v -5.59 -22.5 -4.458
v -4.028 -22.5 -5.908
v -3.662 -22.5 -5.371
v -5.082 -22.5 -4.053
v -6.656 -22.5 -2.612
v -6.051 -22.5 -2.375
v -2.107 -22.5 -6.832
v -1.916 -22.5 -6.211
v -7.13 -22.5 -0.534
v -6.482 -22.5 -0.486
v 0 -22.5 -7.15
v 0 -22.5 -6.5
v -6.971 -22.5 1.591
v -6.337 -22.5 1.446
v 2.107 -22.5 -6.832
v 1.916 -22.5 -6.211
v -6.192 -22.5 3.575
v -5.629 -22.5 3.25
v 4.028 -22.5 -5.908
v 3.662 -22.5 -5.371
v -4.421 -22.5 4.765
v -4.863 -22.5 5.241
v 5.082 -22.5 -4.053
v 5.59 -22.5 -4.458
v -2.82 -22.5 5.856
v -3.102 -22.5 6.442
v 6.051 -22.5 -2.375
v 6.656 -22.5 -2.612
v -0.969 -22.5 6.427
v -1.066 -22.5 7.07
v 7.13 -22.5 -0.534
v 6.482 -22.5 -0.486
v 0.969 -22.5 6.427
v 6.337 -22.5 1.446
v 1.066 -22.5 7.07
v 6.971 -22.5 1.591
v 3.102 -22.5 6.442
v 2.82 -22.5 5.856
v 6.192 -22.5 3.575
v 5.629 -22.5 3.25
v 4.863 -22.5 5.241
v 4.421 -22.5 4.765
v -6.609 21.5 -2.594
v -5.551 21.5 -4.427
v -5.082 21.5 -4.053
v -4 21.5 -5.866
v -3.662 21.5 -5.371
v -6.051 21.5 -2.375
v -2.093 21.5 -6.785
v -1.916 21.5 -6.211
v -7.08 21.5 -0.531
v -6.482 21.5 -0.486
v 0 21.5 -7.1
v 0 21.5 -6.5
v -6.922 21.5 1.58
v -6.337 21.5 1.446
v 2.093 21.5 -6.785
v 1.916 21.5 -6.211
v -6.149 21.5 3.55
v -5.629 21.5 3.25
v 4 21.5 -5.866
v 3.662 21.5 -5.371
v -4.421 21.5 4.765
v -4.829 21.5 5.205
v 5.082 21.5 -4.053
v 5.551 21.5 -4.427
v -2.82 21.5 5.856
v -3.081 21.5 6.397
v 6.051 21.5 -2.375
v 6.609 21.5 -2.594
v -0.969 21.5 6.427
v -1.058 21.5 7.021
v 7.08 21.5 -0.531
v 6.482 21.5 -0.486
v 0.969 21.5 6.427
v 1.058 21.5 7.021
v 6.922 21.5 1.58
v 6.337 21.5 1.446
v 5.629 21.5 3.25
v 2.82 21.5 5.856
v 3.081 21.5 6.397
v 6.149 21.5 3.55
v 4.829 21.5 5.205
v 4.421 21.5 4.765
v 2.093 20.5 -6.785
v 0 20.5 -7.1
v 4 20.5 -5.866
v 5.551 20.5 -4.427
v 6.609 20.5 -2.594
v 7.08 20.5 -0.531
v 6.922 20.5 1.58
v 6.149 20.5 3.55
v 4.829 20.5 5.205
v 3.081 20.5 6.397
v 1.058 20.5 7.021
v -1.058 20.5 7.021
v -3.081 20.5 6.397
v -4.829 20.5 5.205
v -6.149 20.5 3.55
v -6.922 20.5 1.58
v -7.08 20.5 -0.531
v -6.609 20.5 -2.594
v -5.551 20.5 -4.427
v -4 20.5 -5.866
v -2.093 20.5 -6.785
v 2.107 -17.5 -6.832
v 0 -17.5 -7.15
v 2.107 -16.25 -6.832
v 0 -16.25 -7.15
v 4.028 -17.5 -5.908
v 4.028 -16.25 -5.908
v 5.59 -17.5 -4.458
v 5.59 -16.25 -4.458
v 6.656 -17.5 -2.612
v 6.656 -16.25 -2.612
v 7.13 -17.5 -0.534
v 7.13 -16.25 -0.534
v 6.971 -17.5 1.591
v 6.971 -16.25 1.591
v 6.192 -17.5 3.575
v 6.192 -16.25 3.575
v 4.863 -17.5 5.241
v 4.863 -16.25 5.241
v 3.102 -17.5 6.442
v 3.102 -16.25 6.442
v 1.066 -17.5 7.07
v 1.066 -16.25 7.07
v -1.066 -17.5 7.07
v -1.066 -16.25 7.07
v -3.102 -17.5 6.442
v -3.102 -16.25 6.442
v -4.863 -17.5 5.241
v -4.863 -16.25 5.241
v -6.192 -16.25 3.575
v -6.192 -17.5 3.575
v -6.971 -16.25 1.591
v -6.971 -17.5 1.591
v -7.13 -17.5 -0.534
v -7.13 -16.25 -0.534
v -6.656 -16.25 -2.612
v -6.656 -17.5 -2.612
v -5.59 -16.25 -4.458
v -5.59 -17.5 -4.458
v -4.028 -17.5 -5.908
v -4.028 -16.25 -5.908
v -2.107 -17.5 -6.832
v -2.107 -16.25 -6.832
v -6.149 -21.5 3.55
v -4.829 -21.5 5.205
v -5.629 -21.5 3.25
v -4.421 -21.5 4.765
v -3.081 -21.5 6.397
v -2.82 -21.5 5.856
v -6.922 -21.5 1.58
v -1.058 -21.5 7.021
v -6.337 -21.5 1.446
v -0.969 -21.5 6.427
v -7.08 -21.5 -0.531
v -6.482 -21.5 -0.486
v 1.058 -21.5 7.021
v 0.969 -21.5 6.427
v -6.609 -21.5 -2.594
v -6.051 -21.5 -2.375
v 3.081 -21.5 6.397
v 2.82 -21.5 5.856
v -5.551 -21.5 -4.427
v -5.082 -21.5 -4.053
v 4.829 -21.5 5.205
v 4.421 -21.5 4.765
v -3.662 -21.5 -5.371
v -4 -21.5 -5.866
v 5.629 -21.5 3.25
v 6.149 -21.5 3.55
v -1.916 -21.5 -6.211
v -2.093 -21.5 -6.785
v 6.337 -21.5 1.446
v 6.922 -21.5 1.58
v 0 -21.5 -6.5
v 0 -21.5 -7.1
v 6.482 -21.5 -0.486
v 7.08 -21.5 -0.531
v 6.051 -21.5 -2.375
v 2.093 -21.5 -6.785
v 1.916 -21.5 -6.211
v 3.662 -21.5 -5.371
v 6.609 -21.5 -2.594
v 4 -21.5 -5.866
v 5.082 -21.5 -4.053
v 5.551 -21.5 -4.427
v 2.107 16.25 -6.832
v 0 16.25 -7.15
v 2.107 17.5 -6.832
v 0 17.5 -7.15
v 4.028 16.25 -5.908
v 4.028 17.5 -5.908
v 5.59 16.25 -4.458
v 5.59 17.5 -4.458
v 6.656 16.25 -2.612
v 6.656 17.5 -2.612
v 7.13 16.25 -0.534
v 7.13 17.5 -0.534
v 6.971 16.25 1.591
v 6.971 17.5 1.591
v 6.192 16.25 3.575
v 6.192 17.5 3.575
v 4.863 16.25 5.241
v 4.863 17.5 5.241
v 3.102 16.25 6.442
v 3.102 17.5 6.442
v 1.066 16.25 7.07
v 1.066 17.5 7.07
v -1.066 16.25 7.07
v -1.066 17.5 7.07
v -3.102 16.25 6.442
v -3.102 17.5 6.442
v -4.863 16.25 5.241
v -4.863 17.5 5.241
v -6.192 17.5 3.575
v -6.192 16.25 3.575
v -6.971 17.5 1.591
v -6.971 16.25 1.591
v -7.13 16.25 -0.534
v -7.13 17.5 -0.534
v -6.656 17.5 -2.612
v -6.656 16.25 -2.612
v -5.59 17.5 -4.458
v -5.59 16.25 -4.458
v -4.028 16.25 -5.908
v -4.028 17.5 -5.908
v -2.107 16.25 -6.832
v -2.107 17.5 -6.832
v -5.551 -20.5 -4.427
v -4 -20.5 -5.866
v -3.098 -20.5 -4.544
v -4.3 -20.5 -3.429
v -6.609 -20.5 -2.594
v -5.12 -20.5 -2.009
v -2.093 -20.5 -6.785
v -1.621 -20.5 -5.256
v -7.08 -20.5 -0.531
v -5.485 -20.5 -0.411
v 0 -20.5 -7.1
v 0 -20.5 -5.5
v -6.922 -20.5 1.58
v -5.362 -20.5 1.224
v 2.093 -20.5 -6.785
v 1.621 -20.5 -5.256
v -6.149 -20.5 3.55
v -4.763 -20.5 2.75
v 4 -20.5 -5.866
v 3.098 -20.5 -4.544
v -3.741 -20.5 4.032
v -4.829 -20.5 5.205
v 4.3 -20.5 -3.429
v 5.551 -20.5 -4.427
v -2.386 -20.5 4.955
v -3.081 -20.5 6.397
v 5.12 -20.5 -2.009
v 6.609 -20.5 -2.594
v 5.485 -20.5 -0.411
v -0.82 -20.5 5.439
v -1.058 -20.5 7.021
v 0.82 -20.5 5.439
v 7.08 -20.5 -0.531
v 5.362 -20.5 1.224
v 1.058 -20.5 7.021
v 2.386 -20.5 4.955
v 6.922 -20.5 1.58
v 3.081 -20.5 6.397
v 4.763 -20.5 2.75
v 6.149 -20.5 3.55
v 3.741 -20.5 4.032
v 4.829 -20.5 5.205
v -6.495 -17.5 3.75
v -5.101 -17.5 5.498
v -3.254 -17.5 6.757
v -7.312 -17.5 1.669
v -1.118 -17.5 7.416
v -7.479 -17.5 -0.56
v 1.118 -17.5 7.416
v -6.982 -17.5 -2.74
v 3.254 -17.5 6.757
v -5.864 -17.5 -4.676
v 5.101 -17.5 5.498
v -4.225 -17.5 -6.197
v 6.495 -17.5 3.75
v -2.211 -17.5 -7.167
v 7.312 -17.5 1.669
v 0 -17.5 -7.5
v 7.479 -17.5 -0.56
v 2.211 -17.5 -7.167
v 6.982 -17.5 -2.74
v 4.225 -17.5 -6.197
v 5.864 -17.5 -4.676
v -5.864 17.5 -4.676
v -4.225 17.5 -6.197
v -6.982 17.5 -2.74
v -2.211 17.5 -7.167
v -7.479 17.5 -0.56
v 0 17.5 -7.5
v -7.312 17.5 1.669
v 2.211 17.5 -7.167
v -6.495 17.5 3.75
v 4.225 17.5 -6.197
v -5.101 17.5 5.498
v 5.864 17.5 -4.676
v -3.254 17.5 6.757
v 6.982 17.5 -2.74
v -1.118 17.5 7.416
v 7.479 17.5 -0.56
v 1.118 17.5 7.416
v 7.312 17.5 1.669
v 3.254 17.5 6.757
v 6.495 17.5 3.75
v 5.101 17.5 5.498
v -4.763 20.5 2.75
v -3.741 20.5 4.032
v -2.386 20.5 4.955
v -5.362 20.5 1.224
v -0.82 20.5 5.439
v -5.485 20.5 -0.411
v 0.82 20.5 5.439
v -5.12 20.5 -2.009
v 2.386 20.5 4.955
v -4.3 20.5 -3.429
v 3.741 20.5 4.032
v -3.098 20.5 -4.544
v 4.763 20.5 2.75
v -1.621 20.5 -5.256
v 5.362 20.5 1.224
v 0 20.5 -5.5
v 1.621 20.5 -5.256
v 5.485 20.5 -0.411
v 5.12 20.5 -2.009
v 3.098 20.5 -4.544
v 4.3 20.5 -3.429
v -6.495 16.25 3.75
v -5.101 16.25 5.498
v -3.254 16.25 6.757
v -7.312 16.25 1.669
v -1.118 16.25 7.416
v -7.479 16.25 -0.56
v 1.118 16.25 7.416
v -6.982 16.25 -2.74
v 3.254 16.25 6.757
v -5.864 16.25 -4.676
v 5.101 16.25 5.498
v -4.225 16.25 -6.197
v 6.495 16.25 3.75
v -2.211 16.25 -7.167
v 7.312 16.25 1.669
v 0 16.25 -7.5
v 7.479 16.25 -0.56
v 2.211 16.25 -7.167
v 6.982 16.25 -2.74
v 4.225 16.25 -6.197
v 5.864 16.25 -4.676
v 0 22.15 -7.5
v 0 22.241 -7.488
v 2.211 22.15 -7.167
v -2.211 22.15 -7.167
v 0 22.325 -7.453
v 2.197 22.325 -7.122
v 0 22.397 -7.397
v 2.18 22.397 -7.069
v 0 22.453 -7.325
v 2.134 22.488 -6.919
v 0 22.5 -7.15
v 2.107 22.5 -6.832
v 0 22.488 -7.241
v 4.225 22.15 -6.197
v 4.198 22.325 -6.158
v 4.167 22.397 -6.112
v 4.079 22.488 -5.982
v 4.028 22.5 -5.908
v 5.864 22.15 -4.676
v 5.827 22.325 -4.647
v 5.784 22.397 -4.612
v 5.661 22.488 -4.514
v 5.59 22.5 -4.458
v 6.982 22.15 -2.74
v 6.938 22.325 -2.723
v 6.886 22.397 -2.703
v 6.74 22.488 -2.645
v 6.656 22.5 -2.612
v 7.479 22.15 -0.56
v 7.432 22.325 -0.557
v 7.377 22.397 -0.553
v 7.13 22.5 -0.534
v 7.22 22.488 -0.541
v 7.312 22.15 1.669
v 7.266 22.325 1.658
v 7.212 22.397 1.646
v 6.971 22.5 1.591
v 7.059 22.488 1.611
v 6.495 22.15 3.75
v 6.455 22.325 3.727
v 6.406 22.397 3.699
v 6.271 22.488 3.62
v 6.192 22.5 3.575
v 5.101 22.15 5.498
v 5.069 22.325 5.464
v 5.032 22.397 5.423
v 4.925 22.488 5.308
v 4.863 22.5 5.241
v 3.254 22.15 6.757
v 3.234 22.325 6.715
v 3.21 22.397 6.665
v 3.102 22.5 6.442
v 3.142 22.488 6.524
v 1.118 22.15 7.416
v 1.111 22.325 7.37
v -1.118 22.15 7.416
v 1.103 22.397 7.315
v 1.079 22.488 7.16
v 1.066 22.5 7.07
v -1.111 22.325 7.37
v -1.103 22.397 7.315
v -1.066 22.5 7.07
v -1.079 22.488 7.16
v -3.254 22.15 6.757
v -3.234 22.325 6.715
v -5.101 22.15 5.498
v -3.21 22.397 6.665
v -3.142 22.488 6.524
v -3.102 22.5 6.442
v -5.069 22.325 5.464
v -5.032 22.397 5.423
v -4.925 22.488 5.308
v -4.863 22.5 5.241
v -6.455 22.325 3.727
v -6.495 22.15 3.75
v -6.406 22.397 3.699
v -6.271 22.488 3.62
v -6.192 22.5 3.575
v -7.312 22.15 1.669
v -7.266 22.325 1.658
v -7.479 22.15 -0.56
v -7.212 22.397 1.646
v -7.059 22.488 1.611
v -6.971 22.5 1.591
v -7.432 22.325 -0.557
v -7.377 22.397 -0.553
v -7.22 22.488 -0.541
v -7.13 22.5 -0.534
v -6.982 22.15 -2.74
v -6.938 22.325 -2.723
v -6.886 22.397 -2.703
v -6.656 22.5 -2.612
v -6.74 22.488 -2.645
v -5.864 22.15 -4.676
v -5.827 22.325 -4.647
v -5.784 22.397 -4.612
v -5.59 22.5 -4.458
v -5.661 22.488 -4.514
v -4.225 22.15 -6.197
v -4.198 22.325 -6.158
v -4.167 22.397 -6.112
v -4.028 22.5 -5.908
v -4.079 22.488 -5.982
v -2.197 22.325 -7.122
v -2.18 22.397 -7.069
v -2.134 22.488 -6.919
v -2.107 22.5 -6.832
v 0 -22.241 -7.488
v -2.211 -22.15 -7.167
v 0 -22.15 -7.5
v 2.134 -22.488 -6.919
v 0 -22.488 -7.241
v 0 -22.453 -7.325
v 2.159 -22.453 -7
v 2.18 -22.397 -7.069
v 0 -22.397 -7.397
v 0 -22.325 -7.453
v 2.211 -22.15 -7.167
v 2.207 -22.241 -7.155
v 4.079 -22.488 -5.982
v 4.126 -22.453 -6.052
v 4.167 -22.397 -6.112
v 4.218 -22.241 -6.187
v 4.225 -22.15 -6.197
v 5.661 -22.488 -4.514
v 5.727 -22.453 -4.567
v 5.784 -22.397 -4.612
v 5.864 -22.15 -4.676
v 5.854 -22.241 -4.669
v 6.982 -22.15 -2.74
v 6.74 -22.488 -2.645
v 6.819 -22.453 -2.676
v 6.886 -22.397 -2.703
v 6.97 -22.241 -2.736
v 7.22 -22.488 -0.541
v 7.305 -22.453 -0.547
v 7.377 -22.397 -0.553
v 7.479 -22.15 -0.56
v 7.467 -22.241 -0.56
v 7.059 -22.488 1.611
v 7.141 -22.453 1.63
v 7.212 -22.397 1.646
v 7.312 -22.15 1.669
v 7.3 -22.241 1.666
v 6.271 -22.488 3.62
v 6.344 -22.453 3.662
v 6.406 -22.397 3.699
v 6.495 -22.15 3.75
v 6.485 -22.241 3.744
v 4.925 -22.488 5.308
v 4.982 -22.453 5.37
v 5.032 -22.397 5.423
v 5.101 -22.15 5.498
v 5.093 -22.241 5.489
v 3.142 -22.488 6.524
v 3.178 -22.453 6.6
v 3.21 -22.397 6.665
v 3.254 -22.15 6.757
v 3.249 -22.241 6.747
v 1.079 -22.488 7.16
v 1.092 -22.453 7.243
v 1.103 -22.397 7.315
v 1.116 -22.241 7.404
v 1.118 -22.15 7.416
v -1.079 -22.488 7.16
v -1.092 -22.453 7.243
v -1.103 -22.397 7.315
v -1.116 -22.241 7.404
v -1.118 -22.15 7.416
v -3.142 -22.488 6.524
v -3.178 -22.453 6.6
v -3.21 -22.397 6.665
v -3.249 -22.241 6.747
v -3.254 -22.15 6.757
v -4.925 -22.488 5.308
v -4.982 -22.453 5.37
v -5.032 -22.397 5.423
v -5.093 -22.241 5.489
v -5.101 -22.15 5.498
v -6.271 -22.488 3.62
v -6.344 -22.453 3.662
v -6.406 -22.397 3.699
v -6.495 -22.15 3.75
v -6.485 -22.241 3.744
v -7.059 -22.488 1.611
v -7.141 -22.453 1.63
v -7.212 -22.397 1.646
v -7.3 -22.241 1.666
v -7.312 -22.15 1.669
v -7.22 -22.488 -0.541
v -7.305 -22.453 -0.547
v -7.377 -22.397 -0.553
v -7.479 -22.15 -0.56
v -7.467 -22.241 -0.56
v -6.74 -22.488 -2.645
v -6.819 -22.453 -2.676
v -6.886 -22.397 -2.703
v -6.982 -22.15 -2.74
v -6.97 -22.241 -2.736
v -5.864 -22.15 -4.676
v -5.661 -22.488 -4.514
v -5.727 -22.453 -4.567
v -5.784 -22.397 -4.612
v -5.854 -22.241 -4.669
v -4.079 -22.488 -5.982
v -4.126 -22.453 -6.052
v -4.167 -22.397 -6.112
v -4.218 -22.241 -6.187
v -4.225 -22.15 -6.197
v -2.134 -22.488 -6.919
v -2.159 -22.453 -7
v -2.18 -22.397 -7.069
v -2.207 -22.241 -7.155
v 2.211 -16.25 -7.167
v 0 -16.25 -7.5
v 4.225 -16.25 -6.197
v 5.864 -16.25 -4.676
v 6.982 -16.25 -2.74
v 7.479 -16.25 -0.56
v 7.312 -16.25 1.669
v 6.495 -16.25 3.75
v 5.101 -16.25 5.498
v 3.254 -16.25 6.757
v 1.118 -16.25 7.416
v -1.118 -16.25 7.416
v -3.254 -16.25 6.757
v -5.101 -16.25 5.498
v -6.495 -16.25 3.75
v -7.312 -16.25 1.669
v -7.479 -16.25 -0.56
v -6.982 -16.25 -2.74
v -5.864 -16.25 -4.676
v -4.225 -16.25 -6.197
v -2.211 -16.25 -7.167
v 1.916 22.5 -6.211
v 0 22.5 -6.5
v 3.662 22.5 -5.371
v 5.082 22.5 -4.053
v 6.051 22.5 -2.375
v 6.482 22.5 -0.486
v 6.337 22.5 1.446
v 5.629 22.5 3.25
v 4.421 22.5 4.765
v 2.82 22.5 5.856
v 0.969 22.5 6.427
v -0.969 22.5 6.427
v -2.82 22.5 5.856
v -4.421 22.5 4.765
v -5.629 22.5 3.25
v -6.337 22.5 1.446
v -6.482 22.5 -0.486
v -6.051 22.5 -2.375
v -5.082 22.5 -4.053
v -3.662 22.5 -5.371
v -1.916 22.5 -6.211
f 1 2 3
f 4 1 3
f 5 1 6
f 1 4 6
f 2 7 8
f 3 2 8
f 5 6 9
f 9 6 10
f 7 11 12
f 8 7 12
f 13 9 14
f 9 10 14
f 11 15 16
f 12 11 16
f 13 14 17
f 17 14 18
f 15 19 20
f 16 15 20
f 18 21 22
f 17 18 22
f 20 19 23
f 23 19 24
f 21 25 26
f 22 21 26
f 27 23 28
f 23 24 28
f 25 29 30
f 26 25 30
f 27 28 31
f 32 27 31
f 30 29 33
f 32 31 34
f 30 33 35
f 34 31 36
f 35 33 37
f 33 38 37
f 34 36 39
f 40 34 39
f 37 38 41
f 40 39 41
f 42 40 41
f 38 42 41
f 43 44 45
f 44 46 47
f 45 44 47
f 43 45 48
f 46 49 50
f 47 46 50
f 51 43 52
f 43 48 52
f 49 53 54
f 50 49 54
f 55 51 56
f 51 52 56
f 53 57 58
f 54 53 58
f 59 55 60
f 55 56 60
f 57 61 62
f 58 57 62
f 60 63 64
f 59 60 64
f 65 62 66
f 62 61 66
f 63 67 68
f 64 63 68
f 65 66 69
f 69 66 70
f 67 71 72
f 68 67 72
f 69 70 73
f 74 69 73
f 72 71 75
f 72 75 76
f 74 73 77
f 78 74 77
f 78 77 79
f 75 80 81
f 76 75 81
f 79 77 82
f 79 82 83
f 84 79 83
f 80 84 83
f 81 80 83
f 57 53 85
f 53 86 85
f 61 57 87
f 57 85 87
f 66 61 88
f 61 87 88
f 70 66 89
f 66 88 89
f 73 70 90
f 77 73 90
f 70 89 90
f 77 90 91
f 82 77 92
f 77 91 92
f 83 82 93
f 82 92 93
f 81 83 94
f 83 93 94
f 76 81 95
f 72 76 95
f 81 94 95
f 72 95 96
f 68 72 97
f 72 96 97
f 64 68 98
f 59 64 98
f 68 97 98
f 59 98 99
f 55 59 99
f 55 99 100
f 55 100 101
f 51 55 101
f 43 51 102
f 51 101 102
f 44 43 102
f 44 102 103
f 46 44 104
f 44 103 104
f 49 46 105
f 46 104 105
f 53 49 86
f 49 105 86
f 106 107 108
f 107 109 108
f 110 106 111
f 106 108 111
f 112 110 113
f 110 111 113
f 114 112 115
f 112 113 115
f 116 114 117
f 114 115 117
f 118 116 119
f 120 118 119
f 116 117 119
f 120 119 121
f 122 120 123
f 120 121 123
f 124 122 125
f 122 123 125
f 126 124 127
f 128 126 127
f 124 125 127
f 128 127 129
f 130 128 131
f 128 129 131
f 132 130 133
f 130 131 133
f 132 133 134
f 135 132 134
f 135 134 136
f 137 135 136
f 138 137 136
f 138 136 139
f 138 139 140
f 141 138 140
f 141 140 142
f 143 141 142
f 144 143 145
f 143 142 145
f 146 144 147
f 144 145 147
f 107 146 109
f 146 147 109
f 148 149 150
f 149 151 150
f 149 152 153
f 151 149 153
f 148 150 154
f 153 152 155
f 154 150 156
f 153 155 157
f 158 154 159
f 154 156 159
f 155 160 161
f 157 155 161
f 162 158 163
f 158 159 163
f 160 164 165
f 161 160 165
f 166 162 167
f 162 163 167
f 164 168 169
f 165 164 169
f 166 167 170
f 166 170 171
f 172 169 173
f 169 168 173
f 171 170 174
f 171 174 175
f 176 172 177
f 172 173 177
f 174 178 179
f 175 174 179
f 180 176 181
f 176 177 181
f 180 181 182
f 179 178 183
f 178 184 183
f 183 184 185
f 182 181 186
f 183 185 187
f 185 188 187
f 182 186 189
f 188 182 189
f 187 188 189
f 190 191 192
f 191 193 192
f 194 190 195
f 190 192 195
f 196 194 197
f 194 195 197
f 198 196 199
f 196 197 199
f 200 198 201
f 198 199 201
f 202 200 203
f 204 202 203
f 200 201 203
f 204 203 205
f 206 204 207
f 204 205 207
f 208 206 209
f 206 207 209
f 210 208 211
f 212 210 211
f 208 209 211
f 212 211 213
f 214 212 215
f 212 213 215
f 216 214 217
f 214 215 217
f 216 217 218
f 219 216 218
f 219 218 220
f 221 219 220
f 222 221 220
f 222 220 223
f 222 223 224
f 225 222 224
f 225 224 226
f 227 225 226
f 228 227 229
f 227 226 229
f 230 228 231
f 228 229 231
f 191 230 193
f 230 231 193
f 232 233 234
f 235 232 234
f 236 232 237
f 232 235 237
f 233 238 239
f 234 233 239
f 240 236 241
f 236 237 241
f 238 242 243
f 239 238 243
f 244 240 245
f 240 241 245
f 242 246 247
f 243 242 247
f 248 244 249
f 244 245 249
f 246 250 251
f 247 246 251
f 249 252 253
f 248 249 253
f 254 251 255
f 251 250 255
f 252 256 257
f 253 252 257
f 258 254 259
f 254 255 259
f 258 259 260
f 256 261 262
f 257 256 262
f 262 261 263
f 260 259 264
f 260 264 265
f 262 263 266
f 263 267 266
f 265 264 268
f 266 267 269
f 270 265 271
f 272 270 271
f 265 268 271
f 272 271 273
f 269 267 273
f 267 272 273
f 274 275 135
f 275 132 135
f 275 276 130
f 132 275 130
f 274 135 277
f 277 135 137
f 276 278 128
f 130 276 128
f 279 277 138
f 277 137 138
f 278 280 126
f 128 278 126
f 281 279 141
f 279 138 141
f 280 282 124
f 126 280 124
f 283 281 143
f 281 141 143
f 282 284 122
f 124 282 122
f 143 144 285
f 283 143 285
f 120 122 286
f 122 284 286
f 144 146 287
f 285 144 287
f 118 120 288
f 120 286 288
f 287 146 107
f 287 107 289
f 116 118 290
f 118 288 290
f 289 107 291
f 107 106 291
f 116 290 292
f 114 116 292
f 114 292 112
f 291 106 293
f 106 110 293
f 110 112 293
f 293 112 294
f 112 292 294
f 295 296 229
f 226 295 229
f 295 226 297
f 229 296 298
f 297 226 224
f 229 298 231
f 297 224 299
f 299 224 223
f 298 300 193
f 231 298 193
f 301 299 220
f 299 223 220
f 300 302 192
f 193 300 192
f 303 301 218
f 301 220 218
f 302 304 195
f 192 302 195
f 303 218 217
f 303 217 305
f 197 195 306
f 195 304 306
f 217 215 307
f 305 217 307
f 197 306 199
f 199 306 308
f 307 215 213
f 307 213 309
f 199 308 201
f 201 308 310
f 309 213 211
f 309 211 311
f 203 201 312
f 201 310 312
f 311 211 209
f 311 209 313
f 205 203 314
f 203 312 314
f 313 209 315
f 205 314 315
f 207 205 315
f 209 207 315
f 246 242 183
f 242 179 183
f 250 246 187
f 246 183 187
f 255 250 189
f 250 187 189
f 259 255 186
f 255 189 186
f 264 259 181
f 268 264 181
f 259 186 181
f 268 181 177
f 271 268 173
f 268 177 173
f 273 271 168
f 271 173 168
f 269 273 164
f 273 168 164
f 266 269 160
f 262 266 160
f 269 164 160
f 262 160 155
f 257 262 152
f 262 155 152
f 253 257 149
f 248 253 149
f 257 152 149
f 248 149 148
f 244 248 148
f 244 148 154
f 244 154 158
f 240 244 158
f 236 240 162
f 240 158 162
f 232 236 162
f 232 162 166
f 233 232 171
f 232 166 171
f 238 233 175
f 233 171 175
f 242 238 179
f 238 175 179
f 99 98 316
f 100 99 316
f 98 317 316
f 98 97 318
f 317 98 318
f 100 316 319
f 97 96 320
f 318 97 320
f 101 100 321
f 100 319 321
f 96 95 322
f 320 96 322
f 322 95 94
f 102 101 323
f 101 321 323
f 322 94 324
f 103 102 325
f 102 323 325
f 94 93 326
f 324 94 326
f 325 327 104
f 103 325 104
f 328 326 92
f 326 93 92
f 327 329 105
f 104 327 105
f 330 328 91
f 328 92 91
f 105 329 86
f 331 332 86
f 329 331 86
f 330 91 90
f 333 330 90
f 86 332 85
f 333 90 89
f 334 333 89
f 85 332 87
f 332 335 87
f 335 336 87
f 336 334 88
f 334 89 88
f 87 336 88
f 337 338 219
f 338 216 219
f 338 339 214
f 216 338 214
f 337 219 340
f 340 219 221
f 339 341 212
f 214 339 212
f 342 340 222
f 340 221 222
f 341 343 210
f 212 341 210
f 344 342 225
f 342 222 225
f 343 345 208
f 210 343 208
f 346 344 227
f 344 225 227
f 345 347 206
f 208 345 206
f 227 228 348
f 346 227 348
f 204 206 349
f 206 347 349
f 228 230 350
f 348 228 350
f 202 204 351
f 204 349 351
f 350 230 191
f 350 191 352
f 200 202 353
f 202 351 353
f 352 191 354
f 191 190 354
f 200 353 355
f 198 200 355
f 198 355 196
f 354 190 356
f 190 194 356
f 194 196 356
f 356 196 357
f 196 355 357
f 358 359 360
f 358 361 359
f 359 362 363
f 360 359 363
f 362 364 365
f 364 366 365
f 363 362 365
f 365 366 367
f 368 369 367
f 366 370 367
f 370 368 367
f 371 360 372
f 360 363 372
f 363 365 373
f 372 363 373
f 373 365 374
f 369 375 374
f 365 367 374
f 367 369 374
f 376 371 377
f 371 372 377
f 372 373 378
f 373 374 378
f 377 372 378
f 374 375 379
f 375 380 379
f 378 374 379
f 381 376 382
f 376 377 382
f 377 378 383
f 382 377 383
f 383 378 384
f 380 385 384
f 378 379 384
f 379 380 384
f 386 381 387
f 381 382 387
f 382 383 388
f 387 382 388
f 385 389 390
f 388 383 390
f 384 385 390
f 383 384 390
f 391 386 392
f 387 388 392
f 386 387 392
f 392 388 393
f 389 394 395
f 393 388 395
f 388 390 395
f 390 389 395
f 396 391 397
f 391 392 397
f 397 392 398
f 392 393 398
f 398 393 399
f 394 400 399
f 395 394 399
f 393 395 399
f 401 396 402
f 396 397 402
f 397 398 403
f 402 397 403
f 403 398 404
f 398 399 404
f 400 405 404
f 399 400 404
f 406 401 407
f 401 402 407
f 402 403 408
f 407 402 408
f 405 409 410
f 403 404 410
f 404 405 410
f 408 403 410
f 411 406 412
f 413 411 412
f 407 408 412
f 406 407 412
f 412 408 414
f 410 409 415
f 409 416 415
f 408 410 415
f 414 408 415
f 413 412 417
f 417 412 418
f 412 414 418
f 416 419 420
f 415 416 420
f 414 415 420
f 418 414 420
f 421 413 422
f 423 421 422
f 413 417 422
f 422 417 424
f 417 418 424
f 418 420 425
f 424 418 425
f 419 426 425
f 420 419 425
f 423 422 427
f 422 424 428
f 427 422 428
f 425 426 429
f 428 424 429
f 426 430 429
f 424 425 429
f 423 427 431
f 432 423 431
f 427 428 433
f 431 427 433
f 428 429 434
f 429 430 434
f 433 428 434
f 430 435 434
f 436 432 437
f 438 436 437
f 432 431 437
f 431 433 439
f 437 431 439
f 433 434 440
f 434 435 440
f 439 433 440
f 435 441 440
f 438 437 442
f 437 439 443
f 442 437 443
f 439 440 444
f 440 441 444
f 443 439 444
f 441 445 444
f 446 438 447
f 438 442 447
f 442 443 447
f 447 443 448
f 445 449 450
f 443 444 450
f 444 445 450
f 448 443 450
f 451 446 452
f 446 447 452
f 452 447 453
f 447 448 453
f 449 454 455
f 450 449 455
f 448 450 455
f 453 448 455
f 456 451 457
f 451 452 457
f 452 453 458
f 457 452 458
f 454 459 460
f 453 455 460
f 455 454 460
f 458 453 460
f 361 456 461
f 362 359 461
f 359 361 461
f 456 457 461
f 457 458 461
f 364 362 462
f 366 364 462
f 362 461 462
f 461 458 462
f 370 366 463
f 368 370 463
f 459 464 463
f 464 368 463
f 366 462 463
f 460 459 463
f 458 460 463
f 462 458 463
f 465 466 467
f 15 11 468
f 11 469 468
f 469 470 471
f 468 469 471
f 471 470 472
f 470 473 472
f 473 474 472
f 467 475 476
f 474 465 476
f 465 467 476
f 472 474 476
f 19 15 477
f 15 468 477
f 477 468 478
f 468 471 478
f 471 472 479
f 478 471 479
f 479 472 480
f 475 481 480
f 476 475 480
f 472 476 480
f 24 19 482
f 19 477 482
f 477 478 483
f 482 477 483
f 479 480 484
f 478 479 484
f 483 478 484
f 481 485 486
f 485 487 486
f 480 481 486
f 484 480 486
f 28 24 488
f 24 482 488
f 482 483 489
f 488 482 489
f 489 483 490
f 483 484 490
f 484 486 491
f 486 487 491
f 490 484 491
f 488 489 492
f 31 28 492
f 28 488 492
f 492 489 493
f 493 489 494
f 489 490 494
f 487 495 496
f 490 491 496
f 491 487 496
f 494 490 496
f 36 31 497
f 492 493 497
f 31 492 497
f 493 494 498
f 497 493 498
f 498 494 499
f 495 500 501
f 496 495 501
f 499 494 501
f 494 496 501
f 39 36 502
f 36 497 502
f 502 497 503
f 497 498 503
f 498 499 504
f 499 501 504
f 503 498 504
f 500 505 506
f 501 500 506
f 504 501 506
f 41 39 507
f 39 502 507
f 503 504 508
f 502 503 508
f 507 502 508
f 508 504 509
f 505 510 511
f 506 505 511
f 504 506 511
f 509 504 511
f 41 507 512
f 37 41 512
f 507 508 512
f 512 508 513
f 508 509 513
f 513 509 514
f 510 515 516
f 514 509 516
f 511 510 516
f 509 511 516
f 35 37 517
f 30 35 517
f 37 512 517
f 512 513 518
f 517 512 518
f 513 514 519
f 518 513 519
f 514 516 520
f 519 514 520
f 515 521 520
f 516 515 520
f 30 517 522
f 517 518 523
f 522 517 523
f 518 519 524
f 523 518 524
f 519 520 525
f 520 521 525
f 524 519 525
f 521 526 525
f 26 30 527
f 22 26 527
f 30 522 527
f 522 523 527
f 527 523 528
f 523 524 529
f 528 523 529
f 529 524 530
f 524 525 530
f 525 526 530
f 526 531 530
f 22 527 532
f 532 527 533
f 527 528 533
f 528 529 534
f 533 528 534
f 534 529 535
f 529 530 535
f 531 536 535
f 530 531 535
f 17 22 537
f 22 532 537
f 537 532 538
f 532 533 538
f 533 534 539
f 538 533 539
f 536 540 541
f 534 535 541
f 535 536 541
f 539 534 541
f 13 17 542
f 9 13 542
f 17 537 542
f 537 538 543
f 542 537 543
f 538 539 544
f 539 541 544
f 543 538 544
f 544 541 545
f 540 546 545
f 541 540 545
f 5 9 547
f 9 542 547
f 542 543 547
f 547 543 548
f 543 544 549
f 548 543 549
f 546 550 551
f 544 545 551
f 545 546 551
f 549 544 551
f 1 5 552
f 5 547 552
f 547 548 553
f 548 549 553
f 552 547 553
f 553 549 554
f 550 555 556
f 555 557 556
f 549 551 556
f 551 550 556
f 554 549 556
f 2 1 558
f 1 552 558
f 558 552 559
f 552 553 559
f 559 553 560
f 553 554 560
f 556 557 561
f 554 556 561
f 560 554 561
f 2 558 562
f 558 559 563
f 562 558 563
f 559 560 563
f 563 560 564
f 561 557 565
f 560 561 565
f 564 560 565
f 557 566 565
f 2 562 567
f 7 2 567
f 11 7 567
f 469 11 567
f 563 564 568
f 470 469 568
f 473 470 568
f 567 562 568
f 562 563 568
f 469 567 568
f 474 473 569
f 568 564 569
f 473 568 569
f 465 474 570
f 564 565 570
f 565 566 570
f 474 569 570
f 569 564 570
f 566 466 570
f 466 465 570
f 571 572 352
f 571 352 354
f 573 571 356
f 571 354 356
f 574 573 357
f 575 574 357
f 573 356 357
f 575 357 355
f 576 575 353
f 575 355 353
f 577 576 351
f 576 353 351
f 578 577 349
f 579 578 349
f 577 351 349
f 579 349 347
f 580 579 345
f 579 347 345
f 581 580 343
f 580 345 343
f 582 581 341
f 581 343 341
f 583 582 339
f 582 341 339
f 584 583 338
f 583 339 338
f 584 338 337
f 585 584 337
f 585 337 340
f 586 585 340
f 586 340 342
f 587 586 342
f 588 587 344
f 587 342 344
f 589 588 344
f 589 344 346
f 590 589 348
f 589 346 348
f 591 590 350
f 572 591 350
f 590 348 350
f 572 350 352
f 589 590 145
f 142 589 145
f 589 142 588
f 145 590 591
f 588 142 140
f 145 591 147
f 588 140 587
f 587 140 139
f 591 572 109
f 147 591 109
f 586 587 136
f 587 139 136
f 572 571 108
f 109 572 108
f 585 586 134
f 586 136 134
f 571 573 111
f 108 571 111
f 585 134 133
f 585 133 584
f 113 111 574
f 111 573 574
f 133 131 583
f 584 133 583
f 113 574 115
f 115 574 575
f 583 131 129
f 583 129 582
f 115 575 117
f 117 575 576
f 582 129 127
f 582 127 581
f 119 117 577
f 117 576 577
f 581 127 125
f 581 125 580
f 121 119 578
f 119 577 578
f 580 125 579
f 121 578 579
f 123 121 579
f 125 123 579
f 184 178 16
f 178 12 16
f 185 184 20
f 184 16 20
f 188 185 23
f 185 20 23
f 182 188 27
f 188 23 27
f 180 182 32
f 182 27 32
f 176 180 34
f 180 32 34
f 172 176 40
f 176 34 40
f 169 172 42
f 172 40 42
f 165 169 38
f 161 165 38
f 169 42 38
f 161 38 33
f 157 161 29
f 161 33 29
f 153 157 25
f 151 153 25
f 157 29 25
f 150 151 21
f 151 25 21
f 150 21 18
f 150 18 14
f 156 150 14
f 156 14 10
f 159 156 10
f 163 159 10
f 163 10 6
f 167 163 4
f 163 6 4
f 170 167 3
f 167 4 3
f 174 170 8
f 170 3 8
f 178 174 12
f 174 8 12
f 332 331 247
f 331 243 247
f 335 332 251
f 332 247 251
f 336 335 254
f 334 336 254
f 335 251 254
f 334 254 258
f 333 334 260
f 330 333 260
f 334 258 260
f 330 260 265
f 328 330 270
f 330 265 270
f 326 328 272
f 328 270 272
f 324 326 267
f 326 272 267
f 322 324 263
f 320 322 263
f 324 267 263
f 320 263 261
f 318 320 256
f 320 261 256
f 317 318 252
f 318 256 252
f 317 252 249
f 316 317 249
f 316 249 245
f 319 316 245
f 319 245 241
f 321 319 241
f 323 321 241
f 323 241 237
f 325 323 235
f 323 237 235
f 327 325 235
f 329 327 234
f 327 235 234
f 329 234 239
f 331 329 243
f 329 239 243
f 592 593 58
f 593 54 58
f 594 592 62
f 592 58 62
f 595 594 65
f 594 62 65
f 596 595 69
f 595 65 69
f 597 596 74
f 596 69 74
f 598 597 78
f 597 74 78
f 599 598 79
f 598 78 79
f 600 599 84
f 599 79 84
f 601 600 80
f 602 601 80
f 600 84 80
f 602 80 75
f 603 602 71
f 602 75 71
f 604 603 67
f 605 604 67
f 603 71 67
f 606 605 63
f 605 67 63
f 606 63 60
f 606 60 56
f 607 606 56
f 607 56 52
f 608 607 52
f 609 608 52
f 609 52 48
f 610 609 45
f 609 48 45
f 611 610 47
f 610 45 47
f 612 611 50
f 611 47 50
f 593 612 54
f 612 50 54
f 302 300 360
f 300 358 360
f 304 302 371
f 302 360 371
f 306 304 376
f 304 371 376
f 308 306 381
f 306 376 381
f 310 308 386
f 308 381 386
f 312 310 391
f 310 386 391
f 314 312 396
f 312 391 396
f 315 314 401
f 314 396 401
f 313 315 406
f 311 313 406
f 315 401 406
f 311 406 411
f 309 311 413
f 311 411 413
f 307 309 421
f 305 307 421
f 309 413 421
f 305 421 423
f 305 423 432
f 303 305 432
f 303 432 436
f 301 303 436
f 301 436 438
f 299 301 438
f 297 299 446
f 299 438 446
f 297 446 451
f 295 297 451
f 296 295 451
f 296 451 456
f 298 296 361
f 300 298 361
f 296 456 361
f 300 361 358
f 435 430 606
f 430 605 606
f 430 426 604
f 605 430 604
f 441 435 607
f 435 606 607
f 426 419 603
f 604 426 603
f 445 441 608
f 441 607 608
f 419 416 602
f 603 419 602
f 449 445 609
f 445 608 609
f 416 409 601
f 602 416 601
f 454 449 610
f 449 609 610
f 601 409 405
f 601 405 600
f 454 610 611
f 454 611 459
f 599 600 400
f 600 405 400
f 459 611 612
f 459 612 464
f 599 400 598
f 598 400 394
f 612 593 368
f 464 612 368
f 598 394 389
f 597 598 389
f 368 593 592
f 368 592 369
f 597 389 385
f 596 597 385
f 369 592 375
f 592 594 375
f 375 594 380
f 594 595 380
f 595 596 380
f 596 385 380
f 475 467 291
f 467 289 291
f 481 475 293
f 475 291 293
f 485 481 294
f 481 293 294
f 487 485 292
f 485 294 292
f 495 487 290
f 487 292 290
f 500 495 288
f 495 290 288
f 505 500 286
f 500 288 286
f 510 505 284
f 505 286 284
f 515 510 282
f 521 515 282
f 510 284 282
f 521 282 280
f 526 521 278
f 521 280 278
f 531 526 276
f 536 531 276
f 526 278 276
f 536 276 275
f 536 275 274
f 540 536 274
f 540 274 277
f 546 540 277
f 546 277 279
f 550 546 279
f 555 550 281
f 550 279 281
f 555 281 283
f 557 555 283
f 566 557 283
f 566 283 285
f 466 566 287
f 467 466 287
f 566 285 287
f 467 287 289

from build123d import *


with BuildPart() as part:
    # Sketch1 → Revolve1 (revolve)
    with BuildSketch(Plane(origin=(0, 0, 0), x_dir=(0, -1, 0), z_dir=(1, 0, 0))):
        with BuildLine():
            Line((-17.5, 7.5), (-22.15, 7.5))
            ThreePointArc((-22.15, 7.5), (-22.397487373, 7.397487373), (-22.5, 7.15))
            Line((-22.5, 7.15), (-22.5, 6.5))
            Line((-22.5, 6.5), (-21.5, 6.5))
            Line((-21.5, 6.5), (-21.5, 7.1))
            Line((-21.5, 7.1), (-20.5, 7.1))
            Line((-20.5, 7.1), (-20.5, 5.5))
            Line((-20.5, 5.5), (20.5, 5.5))
            Line((20.5, 5.5), (20.5, 7.1))
            Line((20.5, 7.1), (21.5, 7.1))
            Line((21.5, 7.1), (21.5, 6.5))
            Line((21.5, 6.5), (22.5, 6.5))
            Line((22.5, 6.5), (22.5, 7.15))
            ThreePointArc((22.5, 7.15), (22.397487373, 7.397487373), (22.15, 7.5))
            Line((22.15, 7.5), (17.5, 7.5))
            Line((17.5, 7.5), (17.5, 7.15))
            Line((17.5, 7.15), (16.25, 7.15))
            Line((16.25, 7.15), (16.25, 7.5))
            Line((16.25, 7.5), (-16.25, 7.5))
            Line((-16.25, 7.5), (-16.25, 7.15))
            Line((-16.25, 7.15), (-17.5, 7.15))
            Line((-17.5, 7.15), (-17.5, 7.5))
        make_face()
    revolve(axis=Axis((0, 12, 0), (0, -1, 0)))


solid = part.part
